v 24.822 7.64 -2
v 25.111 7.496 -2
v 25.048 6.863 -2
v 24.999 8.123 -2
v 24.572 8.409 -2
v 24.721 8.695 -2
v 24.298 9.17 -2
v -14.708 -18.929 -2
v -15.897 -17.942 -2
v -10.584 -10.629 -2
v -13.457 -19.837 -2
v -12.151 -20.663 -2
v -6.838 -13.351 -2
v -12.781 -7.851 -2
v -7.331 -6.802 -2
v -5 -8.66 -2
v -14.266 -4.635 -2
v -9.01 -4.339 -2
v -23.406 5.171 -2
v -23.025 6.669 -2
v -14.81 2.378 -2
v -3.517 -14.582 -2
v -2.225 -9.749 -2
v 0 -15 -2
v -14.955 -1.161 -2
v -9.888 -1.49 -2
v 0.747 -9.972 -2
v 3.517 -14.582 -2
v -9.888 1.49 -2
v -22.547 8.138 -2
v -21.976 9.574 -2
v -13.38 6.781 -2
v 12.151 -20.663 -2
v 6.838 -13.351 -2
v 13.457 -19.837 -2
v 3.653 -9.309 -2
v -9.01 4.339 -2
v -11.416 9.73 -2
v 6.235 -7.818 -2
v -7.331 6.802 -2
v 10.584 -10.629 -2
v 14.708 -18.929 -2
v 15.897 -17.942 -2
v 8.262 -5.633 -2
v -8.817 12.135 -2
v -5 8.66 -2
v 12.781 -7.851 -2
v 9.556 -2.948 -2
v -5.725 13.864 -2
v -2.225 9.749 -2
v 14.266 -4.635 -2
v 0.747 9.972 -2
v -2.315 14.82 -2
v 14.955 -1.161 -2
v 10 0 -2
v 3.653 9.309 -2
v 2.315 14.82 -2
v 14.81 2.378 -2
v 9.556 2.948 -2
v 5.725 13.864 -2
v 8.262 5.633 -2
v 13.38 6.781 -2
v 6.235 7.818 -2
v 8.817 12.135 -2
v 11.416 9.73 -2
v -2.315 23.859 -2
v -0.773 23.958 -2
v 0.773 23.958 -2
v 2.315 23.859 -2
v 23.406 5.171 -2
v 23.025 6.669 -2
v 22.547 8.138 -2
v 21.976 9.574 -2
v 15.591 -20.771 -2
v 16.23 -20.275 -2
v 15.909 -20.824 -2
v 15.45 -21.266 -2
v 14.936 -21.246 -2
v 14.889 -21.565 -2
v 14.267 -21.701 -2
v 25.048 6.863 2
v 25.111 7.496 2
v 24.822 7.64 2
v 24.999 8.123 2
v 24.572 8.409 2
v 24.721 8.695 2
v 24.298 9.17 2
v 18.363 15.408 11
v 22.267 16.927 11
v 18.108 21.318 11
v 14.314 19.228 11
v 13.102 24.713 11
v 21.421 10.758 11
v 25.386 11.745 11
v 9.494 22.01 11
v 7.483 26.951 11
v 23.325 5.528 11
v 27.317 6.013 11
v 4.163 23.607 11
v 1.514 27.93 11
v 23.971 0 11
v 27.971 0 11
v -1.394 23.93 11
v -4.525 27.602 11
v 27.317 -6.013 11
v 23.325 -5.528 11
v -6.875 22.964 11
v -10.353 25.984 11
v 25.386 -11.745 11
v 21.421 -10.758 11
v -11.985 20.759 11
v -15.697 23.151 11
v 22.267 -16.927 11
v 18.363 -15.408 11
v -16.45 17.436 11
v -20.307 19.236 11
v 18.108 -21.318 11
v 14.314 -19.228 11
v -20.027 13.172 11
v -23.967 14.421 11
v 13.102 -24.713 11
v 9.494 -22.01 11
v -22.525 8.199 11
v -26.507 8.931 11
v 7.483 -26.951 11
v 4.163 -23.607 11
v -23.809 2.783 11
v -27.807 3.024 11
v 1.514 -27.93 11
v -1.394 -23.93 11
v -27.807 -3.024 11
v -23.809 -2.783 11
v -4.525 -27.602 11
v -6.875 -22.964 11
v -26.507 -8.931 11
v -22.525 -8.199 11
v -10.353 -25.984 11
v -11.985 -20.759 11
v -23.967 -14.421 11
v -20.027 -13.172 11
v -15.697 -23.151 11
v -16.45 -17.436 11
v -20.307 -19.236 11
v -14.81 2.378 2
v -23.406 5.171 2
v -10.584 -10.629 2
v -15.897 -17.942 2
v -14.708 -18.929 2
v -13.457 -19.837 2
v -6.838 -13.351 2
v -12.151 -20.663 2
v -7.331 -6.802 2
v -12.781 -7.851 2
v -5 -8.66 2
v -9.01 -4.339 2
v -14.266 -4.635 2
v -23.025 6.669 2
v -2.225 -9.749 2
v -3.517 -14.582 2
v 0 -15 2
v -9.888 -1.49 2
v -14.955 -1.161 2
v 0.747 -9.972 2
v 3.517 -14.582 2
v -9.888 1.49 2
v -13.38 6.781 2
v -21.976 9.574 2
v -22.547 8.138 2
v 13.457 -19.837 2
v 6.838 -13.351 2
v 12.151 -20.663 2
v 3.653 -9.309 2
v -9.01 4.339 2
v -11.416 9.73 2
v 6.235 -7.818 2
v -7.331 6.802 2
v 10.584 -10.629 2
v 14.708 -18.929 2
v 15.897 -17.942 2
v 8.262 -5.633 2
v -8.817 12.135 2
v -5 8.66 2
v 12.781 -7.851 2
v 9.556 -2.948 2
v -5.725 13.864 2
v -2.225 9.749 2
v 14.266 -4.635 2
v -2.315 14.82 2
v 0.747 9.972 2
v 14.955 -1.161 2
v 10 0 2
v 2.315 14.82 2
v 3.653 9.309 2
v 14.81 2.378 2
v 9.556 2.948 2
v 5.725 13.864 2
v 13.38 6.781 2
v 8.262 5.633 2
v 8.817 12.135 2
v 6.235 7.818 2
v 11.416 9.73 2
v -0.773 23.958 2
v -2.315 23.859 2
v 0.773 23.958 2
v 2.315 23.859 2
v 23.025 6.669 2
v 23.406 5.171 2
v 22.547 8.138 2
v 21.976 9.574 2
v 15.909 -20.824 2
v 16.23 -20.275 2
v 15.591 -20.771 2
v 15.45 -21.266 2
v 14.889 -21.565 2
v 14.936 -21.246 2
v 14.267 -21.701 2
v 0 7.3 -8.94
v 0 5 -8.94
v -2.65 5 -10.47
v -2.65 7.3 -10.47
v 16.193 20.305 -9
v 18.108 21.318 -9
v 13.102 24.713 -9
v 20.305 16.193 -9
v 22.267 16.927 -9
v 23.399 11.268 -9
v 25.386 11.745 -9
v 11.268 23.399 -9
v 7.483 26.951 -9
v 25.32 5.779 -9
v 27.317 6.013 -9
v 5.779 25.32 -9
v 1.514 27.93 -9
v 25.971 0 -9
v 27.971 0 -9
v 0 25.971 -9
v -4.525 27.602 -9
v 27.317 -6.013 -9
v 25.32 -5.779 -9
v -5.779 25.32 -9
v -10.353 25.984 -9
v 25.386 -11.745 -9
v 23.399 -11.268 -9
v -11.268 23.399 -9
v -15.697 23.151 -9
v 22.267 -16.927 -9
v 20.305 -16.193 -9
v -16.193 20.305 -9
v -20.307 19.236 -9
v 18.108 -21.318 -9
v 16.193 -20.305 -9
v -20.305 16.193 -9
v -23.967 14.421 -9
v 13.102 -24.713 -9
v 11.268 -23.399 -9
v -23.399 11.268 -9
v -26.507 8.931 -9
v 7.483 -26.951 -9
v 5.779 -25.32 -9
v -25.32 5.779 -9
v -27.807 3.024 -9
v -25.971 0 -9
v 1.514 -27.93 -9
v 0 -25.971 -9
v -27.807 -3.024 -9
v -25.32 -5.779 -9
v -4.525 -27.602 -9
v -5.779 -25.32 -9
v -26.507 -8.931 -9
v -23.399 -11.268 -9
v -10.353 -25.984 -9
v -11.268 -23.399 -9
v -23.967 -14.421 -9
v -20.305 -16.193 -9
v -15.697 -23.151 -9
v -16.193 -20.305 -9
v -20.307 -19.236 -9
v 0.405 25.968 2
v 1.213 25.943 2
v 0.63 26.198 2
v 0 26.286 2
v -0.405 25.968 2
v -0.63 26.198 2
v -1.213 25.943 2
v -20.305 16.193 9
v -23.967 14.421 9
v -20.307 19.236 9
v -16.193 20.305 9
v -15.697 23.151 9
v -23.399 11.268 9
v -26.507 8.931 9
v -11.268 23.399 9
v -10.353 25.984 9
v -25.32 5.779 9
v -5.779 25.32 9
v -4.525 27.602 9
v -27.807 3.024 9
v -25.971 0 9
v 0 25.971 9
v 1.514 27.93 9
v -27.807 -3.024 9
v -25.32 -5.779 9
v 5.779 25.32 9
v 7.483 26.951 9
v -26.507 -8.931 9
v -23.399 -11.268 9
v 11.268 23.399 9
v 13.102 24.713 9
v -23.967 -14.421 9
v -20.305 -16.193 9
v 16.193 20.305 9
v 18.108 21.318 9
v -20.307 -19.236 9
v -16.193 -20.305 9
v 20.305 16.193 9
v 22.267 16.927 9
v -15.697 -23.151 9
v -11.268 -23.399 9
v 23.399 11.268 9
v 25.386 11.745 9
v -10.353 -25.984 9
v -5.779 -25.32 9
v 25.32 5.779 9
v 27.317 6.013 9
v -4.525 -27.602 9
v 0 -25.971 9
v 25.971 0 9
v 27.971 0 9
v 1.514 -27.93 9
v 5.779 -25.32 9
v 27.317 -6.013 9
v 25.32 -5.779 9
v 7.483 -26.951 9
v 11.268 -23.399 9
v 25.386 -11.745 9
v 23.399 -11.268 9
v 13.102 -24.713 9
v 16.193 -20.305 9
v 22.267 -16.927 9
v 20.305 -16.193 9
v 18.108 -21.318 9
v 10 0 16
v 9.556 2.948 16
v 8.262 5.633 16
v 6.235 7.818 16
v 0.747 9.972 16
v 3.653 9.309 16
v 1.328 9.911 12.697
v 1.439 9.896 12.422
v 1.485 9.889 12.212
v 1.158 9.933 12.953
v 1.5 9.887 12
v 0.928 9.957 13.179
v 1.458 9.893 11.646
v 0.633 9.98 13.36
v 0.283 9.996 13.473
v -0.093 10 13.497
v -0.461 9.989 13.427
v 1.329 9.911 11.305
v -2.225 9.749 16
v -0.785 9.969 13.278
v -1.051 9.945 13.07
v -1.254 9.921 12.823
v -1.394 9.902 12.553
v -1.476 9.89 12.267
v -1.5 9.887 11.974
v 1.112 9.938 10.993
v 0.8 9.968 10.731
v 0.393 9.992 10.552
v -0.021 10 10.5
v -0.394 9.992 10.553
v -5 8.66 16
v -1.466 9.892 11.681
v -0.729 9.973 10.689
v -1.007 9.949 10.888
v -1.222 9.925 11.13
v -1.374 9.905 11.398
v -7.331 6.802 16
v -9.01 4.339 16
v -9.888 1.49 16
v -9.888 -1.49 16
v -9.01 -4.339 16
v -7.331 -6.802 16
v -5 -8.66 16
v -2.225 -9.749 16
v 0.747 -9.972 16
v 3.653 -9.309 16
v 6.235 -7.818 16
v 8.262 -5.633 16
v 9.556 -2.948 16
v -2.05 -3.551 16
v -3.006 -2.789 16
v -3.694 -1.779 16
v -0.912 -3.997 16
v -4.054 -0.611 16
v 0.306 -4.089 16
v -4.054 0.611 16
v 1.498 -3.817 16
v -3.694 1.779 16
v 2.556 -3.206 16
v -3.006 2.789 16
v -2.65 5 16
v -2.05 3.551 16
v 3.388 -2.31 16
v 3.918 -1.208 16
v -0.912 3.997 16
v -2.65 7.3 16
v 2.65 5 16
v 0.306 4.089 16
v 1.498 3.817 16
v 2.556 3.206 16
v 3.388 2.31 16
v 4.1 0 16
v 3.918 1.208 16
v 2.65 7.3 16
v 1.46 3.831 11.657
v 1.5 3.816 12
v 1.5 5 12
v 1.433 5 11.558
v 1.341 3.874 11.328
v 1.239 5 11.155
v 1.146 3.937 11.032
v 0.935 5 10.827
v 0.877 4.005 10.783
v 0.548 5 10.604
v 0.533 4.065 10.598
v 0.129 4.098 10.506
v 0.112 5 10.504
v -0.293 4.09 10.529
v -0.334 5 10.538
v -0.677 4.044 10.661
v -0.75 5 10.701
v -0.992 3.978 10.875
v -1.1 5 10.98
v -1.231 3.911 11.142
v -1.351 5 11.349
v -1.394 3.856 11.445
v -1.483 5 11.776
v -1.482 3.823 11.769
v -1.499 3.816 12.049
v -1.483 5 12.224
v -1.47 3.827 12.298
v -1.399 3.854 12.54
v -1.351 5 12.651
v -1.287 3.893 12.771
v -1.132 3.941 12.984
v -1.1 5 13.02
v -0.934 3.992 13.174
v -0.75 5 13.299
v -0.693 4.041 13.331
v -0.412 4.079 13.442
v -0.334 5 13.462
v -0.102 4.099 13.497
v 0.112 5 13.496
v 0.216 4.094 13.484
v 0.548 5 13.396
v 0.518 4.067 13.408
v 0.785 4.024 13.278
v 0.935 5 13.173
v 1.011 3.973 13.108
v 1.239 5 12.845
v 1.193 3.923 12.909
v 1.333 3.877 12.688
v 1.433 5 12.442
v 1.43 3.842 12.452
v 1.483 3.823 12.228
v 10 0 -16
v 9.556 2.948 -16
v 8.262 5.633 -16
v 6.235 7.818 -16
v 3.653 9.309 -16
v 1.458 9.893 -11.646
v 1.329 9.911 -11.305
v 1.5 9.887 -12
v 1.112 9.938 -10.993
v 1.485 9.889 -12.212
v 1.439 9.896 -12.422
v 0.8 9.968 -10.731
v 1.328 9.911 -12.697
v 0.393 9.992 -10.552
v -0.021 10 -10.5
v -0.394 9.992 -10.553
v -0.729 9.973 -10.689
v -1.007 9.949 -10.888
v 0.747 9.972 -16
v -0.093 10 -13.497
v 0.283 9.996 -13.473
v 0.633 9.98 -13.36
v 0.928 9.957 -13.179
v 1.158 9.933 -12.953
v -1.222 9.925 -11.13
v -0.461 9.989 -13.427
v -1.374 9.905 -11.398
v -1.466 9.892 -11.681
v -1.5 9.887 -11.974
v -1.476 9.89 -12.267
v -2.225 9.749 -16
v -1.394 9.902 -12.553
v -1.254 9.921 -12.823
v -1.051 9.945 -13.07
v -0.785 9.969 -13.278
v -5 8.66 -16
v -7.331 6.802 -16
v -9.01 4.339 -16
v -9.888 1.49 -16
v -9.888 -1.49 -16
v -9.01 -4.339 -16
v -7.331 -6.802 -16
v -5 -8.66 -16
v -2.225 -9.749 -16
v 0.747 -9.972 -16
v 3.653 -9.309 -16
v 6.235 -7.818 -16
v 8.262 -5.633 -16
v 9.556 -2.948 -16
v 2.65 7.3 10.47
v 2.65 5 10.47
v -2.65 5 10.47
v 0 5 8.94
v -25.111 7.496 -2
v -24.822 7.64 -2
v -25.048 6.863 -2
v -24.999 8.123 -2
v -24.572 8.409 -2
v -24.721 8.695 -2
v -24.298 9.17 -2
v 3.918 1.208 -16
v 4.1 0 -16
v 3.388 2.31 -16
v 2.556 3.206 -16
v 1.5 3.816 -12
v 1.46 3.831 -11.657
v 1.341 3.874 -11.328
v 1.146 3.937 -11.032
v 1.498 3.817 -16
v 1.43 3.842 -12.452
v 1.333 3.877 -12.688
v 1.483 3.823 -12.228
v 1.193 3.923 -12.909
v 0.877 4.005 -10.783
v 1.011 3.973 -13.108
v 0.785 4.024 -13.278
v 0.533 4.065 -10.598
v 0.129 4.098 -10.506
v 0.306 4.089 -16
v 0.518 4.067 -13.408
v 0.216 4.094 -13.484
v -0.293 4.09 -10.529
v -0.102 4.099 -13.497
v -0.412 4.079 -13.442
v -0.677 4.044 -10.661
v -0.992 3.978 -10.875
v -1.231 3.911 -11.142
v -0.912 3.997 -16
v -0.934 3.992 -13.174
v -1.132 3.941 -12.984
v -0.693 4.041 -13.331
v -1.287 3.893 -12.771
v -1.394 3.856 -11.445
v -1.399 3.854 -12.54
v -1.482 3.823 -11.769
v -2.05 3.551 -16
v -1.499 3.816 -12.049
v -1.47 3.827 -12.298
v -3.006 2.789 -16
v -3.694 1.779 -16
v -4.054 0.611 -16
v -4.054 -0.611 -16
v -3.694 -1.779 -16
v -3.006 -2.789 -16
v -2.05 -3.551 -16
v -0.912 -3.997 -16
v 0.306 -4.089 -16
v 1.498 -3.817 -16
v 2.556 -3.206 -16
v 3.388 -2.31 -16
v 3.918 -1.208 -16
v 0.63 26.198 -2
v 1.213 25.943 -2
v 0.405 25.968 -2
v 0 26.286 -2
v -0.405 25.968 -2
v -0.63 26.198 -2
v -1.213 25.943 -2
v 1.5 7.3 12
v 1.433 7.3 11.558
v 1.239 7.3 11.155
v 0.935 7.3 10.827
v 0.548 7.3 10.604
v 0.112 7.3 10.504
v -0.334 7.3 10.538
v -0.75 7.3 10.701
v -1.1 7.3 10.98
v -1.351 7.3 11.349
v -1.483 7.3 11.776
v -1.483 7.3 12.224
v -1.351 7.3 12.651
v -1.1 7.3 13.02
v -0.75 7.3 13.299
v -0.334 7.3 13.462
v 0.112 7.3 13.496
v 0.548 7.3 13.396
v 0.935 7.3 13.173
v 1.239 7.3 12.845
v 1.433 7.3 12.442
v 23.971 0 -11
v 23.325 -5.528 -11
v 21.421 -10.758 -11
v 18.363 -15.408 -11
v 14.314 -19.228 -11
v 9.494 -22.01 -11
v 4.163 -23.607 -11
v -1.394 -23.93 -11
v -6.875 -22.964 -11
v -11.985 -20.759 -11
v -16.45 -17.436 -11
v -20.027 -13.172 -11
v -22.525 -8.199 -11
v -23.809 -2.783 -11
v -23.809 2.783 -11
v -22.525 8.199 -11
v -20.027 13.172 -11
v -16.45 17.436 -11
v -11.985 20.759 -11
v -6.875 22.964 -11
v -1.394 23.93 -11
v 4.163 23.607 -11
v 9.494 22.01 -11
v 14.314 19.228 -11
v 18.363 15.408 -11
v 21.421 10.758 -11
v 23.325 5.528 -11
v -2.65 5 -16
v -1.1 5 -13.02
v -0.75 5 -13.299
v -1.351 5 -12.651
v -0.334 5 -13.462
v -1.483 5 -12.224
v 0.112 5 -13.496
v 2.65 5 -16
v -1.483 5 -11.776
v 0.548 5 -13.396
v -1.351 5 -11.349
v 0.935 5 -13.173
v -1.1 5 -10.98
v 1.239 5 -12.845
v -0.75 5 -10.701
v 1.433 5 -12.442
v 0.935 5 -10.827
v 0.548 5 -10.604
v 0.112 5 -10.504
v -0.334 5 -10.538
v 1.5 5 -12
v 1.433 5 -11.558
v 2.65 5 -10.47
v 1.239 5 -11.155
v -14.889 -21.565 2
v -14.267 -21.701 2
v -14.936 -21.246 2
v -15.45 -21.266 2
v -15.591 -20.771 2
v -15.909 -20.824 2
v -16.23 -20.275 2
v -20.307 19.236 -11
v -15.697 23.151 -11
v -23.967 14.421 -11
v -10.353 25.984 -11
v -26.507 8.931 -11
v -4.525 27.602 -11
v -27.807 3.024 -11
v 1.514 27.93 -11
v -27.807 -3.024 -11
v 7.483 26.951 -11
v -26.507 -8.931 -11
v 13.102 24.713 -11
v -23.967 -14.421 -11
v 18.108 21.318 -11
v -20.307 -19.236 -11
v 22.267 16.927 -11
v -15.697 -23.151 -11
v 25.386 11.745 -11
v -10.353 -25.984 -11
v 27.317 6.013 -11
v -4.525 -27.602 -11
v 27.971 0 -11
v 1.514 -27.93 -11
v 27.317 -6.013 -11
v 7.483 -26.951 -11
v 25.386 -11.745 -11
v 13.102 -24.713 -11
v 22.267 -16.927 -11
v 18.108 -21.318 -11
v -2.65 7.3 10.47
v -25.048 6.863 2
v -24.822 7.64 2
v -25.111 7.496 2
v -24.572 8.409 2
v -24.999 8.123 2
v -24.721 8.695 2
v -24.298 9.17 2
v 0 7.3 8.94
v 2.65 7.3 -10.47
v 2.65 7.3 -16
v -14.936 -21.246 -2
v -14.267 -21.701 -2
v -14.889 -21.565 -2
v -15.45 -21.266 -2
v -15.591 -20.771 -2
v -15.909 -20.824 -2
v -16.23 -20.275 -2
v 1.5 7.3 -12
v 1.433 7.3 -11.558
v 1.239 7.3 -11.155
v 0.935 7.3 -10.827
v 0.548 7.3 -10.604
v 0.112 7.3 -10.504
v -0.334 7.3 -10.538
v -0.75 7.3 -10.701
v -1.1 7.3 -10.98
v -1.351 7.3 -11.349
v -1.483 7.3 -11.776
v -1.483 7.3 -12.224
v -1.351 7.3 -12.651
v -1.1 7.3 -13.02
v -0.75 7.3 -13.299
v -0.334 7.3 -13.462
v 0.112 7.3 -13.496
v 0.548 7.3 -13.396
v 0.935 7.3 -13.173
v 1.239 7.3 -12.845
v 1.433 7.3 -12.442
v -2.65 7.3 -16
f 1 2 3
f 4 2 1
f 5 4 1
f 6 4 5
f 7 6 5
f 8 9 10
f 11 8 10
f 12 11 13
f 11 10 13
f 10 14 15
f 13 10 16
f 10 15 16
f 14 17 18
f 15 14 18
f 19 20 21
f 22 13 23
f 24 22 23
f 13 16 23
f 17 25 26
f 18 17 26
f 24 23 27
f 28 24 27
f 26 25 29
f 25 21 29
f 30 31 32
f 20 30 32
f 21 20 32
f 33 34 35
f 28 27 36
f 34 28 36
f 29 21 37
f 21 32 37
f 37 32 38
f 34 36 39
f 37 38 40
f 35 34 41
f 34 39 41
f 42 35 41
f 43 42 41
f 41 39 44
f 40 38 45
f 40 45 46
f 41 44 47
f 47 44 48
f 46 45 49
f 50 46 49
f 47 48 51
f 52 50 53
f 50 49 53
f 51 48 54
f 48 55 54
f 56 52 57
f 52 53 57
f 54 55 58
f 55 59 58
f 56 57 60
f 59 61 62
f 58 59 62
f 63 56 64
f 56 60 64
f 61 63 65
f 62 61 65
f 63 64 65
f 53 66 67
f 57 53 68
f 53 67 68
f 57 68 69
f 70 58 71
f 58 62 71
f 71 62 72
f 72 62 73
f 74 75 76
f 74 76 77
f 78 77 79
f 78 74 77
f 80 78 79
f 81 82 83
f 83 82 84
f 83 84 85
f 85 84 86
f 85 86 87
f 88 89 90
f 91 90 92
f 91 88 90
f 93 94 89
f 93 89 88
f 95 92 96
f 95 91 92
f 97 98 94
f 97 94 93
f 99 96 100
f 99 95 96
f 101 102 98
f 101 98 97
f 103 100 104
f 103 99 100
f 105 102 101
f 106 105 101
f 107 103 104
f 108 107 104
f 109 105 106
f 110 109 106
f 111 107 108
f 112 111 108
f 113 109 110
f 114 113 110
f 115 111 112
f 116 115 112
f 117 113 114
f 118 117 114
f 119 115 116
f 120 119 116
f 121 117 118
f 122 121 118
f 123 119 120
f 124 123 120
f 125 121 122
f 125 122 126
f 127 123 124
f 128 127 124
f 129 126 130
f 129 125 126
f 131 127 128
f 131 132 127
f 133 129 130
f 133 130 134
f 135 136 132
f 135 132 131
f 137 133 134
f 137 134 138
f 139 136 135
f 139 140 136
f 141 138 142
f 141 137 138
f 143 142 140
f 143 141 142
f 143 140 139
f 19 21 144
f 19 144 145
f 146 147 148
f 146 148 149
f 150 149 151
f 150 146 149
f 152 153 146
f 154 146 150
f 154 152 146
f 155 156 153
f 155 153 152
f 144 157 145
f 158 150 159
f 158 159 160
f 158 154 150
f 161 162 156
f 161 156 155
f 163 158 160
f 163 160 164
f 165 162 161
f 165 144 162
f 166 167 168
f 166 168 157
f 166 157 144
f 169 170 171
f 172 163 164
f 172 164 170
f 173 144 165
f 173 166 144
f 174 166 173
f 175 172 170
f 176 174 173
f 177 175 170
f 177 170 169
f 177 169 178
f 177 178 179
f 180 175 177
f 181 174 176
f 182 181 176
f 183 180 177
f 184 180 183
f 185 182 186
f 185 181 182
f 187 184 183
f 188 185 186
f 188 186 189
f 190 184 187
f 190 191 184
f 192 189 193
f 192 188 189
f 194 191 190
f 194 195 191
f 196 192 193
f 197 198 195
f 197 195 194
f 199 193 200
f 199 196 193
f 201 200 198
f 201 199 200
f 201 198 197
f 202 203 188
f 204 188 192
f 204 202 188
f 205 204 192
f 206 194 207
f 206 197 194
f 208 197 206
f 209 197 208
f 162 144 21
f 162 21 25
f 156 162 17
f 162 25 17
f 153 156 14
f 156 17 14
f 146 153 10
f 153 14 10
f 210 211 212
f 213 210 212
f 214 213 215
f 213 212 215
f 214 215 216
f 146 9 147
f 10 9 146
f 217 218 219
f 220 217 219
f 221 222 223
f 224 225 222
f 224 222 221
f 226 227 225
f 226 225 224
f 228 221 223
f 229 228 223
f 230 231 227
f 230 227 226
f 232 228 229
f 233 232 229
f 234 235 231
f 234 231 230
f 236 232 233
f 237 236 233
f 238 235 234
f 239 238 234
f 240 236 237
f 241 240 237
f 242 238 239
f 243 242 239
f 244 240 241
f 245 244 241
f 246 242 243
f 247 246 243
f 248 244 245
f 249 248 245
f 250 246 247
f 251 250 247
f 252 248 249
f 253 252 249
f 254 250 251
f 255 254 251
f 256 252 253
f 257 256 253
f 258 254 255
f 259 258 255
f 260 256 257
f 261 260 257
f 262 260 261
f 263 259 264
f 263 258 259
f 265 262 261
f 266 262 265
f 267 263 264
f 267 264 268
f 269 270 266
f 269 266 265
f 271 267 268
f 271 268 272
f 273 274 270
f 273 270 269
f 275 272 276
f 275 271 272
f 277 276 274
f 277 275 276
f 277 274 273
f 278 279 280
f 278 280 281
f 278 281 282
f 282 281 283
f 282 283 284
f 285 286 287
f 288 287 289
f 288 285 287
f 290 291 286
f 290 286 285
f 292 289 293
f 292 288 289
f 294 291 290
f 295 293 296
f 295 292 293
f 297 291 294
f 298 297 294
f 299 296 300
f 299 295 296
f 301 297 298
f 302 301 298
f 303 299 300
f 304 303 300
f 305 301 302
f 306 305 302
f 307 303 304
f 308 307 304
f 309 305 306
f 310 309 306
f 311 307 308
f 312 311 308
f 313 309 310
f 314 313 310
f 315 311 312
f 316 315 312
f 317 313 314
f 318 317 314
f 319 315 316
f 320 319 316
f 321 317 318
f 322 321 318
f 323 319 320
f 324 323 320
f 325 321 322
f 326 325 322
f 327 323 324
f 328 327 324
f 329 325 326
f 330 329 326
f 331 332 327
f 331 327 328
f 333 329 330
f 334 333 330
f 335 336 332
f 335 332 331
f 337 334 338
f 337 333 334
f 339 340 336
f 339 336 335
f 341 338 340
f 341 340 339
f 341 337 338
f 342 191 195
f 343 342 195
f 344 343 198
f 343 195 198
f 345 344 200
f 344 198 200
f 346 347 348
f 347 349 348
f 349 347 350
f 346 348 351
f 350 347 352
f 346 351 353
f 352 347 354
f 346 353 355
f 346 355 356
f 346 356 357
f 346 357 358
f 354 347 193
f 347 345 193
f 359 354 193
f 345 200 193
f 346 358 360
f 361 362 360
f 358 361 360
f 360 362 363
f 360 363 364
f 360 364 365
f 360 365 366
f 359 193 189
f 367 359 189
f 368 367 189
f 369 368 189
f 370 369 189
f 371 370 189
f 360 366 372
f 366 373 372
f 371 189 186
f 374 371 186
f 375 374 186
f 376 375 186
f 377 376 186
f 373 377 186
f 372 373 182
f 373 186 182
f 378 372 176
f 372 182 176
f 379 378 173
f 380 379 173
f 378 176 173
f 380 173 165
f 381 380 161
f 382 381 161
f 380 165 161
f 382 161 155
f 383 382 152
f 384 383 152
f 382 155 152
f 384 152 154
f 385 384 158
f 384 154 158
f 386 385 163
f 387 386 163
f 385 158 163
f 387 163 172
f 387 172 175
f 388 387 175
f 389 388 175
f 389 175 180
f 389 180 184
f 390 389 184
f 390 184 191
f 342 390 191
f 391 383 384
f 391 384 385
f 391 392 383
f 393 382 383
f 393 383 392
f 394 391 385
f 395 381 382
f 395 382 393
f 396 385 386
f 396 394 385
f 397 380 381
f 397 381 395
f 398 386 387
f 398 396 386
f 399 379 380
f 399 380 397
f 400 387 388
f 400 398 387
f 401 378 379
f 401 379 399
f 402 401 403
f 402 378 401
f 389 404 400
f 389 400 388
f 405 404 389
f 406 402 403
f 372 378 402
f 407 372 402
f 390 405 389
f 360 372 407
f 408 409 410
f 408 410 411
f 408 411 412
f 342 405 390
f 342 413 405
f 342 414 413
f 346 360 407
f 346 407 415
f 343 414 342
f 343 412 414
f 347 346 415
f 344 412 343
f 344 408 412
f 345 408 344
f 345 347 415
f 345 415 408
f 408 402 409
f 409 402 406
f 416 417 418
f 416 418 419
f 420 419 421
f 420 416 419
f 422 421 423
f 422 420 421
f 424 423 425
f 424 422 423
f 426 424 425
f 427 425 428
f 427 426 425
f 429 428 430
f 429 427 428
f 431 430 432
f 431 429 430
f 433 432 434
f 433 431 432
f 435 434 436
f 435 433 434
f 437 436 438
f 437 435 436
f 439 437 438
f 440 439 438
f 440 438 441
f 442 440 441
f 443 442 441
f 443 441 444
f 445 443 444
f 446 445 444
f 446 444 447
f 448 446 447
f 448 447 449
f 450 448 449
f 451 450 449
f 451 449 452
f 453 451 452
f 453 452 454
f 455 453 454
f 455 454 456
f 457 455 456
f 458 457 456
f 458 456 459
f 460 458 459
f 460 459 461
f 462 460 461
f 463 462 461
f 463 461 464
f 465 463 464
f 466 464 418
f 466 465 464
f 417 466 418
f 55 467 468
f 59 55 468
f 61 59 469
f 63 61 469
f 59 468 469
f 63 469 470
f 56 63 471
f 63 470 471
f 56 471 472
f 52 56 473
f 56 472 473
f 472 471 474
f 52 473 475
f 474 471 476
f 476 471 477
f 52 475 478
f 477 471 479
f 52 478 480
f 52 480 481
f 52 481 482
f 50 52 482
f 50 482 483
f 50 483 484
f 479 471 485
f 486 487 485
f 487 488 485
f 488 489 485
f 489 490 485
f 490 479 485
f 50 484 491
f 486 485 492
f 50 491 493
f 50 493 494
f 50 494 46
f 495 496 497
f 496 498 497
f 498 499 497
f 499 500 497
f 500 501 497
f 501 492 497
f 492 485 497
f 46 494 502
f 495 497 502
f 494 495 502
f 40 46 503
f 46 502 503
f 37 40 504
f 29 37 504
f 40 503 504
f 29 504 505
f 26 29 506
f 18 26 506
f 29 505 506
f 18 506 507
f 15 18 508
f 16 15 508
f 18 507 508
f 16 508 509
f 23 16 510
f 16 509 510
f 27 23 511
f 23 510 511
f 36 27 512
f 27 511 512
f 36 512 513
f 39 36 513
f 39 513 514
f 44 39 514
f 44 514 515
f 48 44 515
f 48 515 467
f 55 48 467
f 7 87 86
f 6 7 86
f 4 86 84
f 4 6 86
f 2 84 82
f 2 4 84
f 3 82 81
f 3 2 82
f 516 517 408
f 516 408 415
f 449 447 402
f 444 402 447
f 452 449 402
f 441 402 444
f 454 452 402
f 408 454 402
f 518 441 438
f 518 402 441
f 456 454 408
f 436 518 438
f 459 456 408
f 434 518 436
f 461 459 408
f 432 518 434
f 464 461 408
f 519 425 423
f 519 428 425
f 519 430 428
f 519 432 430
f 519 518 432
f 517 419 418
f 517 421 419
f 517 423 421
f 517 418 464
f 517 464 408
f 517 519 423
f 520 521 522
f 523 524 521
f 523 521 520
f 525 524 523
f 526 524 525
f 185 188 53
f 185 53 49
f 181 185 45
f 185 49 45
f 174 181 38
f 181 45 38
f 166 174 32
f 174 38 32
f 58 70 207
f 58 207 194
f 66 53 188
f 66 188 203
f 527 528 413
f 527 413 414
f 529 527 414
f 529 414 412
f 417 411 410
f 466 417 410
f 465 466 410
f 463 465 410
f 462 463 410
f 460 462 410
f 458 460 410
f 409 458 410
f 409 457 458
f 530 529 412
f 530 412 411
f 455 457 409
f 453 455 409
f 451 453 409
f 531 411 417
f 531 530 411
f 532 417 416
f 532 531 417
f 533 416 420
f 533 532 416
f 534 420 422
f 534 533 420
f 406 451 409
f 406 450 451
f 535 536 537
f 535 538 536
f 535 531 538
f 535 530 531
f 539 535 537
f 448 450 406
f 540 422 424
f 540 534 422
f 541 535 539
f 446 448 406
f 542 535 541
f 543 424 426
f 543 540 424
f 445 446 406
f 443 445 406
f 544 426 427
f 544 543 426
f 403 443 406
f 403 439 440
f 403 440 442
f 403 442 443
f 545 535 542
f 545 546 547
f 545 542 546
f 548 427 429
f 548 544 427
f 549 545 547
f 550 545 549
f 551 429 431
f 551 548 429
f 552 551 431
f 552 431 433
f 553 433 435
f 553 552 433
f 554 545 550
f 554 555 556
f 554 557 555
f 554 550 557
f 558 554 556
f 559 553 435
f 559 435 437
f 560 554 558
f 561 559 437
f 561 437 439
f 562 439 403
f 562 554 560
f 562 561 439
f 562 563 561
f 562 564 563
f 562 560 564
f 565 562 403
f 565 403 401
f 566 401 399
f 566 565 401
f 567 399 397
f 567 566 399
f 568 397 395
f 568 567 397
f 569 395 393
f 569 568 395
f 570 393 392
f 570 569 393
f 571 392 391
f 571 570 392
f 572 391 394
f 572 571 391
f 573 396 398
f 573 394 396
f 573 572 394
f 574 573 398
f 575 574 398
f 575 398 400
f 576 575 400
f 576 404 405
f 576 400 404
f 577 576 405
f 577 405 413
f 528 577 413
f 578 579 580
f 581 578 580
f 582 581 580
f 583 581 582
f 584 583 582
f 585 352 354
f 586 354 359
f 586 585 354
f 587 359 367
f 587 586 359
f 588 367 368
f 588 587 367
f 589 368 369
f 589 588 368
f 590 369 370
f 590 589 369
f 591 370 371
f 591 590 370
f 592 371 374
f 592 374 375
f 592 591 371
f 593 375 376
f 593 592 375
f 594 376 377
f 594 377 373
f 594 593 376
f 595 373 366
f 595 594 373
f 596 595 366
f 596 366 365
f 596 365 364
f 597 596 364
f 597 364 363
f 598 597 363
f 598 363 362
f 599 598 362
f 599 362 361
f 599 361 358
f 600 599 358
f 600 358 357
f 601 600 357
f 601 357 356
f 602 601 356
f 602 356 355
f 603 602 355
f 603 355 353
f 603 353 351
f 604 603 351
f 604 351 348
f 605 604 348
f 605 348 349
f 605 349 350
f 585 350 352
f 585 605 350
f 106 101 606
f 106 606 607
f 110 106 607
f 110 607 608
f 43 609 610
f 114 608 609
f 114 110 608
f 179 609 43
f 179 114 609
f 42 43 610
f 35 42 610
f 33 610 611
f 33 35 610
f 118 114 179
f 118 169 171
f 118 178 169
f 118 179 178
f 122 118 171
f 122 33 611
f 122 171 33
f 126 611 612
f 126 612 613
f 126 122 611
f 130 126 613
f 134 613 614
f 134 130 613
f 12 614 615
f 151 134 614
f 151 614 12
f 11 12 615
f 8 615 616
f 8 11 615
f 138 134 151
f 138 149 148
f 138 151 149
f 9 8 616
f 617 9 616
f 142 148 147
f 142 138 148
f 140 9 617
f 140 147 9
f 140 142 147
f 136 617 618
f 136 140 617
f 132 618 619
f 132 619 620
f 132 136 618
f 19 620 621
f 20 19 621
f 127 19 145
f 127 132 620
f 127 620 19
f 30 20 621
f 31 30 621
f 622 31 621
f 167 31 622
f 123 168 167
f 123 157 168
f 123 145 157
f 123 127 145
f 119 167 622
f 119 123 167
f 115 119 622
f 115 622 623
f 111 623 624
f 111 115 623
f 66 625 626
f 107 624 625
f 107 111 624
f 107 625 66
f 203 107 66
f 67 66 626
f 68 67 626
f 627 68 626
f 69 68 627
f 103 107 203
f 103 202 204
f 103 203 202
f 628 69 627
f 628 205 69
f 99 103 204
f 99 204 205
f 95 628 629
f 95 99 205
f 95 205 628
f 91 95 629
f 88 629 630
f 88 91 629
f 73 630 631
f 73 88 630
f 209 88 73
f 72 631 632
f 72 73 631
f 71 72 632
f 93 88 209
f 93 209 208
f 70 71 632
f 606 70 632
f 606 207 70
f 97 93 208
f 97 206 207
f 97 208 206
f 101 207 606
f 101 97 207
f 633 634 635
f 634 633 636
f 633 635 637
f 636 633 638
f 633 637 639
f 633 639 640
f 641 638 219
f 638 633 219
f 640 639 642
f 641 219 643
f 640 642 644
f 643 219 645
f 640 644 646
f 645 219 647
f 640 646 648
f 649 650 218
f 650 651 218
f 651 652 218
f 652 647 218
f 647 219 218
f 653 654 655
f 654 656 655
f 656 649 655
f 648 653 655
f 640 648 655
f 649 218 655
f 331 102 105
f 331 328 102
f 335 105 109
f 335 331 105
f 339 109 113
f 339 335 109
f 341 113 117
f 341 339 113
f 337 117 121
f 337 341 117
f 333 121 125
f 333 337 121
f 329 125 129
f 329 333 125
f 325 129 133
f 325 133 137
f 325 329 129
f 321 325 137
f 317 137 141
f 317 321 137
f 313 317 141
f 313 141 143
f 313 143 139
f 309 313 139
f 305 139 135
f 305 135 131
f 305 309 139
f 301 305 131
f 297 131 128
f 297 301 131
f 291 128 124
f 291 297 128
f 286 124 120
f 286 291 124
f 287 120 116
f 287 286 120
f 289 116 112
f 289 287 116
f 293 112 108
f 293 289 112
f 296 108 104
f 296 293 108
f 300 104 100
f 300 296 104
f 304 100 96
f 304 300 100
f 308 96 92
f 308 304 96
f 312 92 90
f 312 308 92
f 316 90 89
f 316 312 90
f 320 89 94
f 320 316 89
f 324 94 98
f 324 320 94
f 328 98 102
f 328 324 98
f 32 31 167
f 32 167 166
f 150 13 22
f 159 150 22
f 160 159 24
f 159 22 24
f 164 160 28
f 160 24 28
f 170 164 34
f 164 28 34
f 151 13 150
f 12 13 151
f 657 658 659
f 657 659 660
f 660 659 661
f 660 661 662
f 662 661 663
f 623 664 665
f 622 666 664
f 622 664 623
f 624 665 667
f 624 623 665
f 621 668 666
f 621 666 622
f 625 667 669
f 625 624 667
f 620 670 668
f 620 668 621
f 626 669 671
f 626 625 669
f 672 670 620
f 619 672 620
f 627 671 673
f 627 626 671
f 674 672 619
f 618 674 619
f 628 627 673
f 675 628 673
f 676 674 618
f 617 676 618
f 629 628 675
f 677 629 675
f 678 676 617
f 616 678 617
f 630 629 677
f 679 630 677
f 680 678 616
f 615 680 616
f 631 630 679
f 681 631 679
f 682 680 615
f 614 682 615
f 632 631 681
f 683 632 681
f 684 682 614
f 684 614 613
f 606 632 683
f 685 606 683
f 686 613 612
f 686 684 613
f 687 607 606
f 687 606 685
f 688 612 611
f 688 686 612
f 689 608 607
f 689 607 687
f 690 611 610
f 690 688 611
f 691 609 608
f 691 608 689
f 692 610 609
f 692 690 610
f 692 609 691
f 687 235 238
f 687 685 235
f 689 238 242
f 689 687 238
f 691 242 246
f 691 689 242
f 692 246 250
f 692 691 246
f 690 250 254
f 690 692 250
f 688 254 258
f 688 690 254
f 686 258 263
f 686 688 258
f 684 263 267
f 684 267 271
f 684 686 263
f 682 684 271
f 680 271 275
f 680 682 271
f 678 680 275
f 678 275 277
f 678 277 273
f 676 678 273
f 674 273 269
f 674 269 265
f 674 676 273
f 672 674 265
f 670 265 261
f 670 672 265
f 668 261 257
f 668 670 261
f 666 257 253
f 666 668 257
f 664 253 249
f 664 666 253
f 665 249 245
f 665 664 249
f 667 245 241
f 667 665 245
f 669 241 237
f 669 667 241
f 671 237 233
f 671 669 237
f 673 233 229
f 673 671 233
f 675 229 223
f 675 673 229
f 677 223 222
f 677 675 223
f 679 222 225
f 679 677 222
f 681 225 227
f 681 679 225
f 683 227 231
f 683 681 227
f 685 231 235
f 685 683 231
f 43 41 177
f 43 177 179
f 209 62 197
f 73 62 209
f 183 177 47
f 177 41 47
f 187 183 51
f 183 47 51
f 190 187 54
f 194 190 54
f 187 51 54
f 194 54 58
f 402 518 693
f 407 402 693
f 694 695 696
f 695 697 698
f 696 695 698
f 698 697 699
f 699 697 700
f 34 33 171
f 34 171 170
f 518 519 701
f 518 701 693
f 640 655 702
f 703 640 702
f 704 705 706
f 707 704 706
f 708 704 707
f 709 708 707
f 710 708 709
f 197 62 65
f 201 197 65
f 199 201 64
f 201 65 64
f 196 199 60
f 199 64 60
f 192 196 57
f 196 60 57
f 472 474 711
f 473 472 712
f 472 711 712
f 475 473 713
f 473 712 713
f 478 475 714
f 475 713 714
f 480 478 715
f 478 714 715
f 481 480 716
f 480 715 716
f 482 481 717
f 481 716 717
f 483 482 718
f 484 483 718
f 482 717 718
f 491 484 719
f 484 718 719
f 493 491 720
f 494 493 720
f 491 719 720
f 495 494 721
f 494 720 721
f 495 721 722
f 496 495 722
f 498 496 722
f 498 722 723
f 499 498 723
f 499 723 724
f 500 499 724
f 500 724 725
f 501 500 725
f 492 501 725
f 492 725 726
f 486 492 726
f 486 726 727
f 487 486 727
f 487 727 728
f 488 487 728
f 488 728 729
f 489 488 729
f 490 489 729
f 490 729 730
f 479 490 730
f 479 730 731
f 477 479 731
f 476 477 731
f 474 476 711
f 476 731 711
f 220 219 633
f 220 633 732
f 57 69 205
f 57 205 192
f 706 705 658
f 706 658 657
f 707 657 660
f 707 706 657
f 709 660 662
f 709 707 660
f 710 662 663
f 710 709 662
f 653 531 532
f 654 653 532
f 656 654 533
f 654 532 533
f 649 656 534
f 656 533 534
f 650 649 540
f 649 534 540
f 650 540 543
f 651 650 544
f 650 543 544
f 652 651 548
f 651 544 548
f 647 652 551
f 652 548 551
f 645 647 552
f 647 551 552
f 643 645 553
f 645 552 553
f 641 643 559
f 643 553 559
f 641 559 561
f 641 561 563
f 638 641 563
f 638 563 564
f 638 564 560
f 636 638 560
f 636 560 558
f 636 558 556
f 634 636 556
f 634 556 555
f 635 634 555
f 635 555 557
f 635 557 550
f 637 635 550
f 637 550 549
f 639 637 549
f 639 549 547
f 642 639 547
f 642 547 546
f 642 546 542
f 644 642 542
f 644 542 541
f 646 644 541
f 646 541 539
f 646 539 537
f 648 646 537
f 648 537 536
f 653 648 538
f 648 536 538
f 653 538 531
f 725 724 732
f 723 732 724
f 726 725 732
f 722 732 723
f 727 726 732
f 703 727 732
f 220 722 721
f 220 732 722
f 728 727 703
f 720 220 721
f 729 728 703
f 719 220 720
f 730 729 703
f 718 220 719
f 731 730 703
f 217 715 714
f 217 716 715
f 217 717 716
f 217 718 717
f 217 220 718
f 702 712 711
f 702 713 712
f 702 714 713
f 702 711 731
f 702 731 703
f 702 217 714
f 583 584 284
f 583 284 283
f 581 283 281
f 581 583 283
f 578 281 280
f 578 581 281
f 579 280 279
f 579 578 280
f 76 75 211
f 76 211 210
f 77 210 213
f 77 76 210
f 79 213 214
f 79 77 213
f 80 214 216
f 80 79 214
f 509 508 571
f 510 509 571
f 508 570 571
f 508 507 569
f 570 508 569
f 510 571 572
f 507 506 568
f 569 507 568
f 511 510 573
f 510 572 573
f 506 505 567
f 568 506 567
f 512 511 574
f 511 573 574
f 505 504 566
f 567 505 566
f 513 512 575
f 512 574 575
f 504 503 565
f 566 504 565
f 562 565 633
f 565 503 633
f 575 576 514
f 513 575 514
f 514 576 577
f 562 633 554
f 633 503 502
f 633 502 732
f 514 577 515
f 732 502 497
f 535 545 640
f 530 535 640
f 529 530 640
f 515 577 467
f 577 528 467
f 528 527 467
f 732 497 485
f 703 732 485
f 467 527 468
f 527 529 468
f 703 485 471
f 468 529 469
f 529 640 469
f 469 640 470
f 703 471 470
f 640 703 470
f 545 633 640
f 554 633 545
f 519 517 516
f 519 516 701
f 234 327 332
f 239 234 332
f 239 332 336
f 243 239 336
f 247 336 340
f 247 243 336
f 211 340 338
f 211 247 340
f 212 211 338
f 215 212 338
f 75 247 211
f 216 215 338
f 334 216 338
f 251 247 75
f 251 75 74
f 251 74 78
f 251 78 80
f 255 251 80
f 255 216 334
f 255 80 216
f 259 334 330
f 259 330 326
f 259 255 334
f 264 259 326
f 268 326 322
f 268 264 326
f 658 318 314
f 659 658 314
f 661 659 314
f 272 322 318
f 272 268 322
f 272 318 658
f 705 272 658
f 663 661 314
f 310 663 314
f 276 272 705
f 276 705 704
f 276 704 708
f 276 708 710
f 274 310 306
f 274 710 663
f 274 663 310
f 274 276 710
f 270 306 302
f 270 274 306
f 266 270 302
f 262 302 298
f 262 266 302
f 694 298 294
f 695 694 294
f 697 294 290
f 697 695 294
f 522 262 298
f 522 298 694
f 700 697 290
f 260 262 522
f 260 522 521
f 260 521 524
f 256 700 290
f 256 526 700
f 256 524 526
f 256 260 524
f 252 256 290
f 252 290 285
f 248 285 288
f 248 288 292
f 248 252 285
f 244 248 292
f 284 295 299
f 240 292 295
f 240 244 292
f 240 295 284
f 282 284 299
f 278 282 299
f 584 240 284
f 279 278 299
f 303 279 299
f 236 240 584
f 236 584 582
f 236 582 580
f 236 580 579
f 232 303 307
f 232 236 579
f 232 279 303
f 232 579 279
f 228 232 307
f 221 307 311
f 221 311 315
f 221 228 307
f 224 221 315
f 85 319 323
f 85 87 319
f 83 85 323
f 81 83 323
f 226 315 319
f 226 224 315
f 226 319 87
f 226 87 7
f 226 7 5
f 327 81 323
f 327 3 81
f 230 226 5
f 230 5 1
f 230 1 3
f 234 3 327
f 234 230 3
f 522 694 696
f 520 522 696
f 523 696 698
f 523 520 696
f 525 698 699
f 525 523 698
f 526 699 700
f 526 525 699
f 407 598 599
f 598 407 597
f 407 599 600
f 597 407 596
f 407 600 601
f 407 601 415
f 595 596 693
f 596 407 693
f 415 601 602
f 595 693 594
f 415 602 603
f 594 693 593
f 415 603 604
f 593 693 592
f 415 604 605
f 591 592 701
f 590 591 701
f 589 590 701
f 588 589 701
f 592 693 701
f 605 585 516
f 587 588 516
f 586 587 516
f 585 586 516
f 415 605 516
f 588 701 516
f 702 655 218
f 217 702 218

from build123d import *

# Parameters (mm, degrees)
BOSS_EXTRUDE1_DEPTH      = 2
BOSS_EXTRUDE1_DEPTH_BACK = 2
SKETCH3_R                = 15
BOSS_EXTRUDE2_DEPTH      = 16
BOSS_EXTRUDE2_DEPTH_BACK = 16
SKETCH6_R                = 10
CUT_EXTRUDE6_DEPTH       = 43.670158732
CUT_EXTRUDE6_DEPTH_BACK  = 43.670158732
SKETCH7_R                = 4.1
BOSS_EXTRUDE3_DEPTH      = 2
BOSS_EXTRUDE3_DEPTH_BACK = 2
SKETCH10_W               = 5.3
SKETCH10_H               = 2.3
CUT_EXTRUDE7_DEPTH       = 4
CUT_EXTRUDE8_START       = -4
SKETCH11_R               = 1.5
CUT_EXTRUDE8_DEPTH       = 10
CUT_EXTRUDE9_DEPTH       = 2.3


with BuildPart() as part:
    # Sketch2 → Revolve1 (revolve)
    with BuildSketch(Plane(origin=(0, 0, 0), x_dir=(0, 0, -1), z_dir=(1, 0, 0)), mode=Mode.PRIVATE) as revolve1_sk:
        Polygon((-9, 25.970899576), (9, 25.970899576), (9, 27.970899576), (11, 27.970899576), (11, 23.970899576), (-11, 23.970899576), (-11, 27.970899576), (-9, 27.970899576), align=None)
    revolve(revolve1_sk.sketch.rotate(Axis((0, 0, 10), (0, 0, -1)), 90), axis=Axis((0, 0, 10), (0, 0, -1)))



with BuildPart() as body_2:
    # Sketch3 → Boss-Extrude1 (new, two sides: drawn at the far end of the back side and taken through both)
    with BuildSketch(Plane.XY.offset(-BOSS_EXTRUDE1_DEPTH_BACK)):
        Circle(SKETCH3_R)
    extrude(amount=BOSS_EXTRUDE1_DEPTH + BOSS_EXTRUDE1_DEPTH_BACK)

    # Sketch6 → Boss-Extrude2 (add, two sides: drawn at the far end of the back side and taken through both)
    with BuildSketch(Plane.XY.offset(-BOSS_EXTRUDE2_DEPTH_BACK)):
        Circle(SKETCH6_R)
    extrude(amount=BOSS_EXTRUDE2_DEPTH + BOSS_EXTRUDE2_DEPTH_BACK)

    # Sketch7 → Cut-Extrude6 (cut, two sides: drawn at the far end of the back side and taken through both)
    with BuildSketch(Plane.XY.offset(-CUT_EXTRUDE6_DEPTH_BACK)):
        Circle(SKETCH7_R)
    extrude(amount=CUT_EXTRUDE6_DEPTH + CUT_EXTRUDE6_DEPTH_BACK, mode=Mode.SUBTRACT)


with BuildPart() as part_1:
    add(part.part)

    add(body_2.part)  # Boss-Extrude3 merges body 2
    # Sketch8 → Boss-Extrude3 (add, two sides: drawn at the far end of the back side and taken through both)
    with BuildSketch(Plane.XY.offset(-BOSS_EXTRUDE3_DEPTH_BACK)):
        with BuildLine():
            Line((-2.314963667, 11.983341333), (-2.314963667, 23.970899576))
            ThreePointArc((-2.314963667, 23.970899576), (0, 26.285863243), (2.314963667, 23.970899576))
            Line((2.314963667, 23.970899576), (2.314963667, 11.983341333))
            ThreePointArc((2.314963667, 11.983341333), (0, 9.668377666), (-2.314963667, 11.983341333))
        make_face()
        with BuildLine():
            Line((10.681471747, 5.904717401), (22.082317129, 9.60907662))
            ThreePointArc((22.082317129, 9.60907662), (24.999341523, 8.122778454), (23.513043358, 5.205754059))
            Line((23.513043358, 5.205754059), (12.112197976, 1.501394841))
            ThreePointArc((12.112197976, 1.501394841), (9.195173582, 2.987693007), (10.681471747, 5.904717401))
        make_face()
        with BuildLine():
            Line((8.916476256, -8.334025285), (15.962586203, -18.032163625))
            ThreePointArc((15.962586203, -18.032163625), (15.450442758, -21.265710075), (12.216896307, -20.75356663))
            Line((12.216896307, -20.75356663), (5.170786361, -11.055428291))
            ThreePointArc((5.170786361, -11.055428291), (5.682929806, -7.82188184), (8.916476256, -8.334025285))
        make_face()
        with BuildLine():
            Line((-5.170786361, -11.055428291), (-12.216896307, -20.75356663))
            ThreePointArc((-12.216896307, -20.75356663), (-15.450442758, -21.265710075), (-15.962586203, -18.032163625))
            Line((-15.962586203, -18.032163625), (-8.916476256, -8.334025285))
            ThreePointArc((-8.916476256, -8.334025285), (-5.682929806, -7.82188184), (-5.170786361, -11.055428291))
        make_face()
        with BuildLine():
            Line((-12.112197976, 1.501394841), (-23.513043358, 5.205754059))
            ThreePointArc((-23.513043358, 5.205754059), (-24.999341523, 8.122778454), (-22.082317129, 9.60907662))
            Line((-22.082317129, 9.60907662), (-10.681471747, 5.904717401))
            ThreePointArc((-10.681471747, 5.904717401), (-9.195173582, 2.987693007), (-12.112197976, 1.501394841))
        make_face()
    extrude(amount=BOSS_EXTRUDE3_DEPTH + BOSS_EXTRUDE3_DEPTH_BACK)

    # Sketch10 → Cut-Extrude7 (cut)
    with BuildSketch(Plane.XY.offset(12)):
        with Locations((0, 6.15)):
            Rectangle(SKETCH10_W, SKETCH10_H)
    cut_extrude7 = extrude(amount=CUT_EXTRUDE7_DEPTH, mode=Mode.SUBTRACT)

    # Sketch11 → Cut-Extrude8 (cut)
    with BuildSketch(Plane(origin=(0, 5, 0), x_dir=(1, 0, 0), z_dir=(0, 1, 0)).offset(CUT_EXTRUDE8_START)):
        with Locations((0, -12)):
            Circle(SKETCH11_R)
    cut_extrude8 = extrude(amount=CUT_EXTRUDE8_DEPTH, mode=Mode.SUBTRACT)

    # Sketch12 → Cut-Extrude9 (cut)
    with BuildSketch(Plane(origin=(0, 5, 0), x_dir=(1, 0, 0), z_dir=(0, 1, 0))):
        Polygon((0, -15.059956427), (2.65, -13.529978213), (2.65, -10.470021787), (0, -8.940043573), (-2.65, -10.470021787), (-2.65, -13.529978213), align=None)
    cut_extrude9 = extrude(amount=CUT_EXTRUDE9_DEPTH, mode=Mode.SUBTRACT)

    # Mirror1: Cut-Extrude7, Cut-Extrude8, Cut-Extrude9 across plane
    add(cut_extrude7.mirror(Plane.XY), mode=Mode.SUBTRACT)
    add(cut_extrude8.mirror(Plane.XY), mode=Mode.SUBTRACT)
    add(cut_extrude9.mirror(Plane.XY), mode=Mode.SUBTRACT)


solid = part_1.part
